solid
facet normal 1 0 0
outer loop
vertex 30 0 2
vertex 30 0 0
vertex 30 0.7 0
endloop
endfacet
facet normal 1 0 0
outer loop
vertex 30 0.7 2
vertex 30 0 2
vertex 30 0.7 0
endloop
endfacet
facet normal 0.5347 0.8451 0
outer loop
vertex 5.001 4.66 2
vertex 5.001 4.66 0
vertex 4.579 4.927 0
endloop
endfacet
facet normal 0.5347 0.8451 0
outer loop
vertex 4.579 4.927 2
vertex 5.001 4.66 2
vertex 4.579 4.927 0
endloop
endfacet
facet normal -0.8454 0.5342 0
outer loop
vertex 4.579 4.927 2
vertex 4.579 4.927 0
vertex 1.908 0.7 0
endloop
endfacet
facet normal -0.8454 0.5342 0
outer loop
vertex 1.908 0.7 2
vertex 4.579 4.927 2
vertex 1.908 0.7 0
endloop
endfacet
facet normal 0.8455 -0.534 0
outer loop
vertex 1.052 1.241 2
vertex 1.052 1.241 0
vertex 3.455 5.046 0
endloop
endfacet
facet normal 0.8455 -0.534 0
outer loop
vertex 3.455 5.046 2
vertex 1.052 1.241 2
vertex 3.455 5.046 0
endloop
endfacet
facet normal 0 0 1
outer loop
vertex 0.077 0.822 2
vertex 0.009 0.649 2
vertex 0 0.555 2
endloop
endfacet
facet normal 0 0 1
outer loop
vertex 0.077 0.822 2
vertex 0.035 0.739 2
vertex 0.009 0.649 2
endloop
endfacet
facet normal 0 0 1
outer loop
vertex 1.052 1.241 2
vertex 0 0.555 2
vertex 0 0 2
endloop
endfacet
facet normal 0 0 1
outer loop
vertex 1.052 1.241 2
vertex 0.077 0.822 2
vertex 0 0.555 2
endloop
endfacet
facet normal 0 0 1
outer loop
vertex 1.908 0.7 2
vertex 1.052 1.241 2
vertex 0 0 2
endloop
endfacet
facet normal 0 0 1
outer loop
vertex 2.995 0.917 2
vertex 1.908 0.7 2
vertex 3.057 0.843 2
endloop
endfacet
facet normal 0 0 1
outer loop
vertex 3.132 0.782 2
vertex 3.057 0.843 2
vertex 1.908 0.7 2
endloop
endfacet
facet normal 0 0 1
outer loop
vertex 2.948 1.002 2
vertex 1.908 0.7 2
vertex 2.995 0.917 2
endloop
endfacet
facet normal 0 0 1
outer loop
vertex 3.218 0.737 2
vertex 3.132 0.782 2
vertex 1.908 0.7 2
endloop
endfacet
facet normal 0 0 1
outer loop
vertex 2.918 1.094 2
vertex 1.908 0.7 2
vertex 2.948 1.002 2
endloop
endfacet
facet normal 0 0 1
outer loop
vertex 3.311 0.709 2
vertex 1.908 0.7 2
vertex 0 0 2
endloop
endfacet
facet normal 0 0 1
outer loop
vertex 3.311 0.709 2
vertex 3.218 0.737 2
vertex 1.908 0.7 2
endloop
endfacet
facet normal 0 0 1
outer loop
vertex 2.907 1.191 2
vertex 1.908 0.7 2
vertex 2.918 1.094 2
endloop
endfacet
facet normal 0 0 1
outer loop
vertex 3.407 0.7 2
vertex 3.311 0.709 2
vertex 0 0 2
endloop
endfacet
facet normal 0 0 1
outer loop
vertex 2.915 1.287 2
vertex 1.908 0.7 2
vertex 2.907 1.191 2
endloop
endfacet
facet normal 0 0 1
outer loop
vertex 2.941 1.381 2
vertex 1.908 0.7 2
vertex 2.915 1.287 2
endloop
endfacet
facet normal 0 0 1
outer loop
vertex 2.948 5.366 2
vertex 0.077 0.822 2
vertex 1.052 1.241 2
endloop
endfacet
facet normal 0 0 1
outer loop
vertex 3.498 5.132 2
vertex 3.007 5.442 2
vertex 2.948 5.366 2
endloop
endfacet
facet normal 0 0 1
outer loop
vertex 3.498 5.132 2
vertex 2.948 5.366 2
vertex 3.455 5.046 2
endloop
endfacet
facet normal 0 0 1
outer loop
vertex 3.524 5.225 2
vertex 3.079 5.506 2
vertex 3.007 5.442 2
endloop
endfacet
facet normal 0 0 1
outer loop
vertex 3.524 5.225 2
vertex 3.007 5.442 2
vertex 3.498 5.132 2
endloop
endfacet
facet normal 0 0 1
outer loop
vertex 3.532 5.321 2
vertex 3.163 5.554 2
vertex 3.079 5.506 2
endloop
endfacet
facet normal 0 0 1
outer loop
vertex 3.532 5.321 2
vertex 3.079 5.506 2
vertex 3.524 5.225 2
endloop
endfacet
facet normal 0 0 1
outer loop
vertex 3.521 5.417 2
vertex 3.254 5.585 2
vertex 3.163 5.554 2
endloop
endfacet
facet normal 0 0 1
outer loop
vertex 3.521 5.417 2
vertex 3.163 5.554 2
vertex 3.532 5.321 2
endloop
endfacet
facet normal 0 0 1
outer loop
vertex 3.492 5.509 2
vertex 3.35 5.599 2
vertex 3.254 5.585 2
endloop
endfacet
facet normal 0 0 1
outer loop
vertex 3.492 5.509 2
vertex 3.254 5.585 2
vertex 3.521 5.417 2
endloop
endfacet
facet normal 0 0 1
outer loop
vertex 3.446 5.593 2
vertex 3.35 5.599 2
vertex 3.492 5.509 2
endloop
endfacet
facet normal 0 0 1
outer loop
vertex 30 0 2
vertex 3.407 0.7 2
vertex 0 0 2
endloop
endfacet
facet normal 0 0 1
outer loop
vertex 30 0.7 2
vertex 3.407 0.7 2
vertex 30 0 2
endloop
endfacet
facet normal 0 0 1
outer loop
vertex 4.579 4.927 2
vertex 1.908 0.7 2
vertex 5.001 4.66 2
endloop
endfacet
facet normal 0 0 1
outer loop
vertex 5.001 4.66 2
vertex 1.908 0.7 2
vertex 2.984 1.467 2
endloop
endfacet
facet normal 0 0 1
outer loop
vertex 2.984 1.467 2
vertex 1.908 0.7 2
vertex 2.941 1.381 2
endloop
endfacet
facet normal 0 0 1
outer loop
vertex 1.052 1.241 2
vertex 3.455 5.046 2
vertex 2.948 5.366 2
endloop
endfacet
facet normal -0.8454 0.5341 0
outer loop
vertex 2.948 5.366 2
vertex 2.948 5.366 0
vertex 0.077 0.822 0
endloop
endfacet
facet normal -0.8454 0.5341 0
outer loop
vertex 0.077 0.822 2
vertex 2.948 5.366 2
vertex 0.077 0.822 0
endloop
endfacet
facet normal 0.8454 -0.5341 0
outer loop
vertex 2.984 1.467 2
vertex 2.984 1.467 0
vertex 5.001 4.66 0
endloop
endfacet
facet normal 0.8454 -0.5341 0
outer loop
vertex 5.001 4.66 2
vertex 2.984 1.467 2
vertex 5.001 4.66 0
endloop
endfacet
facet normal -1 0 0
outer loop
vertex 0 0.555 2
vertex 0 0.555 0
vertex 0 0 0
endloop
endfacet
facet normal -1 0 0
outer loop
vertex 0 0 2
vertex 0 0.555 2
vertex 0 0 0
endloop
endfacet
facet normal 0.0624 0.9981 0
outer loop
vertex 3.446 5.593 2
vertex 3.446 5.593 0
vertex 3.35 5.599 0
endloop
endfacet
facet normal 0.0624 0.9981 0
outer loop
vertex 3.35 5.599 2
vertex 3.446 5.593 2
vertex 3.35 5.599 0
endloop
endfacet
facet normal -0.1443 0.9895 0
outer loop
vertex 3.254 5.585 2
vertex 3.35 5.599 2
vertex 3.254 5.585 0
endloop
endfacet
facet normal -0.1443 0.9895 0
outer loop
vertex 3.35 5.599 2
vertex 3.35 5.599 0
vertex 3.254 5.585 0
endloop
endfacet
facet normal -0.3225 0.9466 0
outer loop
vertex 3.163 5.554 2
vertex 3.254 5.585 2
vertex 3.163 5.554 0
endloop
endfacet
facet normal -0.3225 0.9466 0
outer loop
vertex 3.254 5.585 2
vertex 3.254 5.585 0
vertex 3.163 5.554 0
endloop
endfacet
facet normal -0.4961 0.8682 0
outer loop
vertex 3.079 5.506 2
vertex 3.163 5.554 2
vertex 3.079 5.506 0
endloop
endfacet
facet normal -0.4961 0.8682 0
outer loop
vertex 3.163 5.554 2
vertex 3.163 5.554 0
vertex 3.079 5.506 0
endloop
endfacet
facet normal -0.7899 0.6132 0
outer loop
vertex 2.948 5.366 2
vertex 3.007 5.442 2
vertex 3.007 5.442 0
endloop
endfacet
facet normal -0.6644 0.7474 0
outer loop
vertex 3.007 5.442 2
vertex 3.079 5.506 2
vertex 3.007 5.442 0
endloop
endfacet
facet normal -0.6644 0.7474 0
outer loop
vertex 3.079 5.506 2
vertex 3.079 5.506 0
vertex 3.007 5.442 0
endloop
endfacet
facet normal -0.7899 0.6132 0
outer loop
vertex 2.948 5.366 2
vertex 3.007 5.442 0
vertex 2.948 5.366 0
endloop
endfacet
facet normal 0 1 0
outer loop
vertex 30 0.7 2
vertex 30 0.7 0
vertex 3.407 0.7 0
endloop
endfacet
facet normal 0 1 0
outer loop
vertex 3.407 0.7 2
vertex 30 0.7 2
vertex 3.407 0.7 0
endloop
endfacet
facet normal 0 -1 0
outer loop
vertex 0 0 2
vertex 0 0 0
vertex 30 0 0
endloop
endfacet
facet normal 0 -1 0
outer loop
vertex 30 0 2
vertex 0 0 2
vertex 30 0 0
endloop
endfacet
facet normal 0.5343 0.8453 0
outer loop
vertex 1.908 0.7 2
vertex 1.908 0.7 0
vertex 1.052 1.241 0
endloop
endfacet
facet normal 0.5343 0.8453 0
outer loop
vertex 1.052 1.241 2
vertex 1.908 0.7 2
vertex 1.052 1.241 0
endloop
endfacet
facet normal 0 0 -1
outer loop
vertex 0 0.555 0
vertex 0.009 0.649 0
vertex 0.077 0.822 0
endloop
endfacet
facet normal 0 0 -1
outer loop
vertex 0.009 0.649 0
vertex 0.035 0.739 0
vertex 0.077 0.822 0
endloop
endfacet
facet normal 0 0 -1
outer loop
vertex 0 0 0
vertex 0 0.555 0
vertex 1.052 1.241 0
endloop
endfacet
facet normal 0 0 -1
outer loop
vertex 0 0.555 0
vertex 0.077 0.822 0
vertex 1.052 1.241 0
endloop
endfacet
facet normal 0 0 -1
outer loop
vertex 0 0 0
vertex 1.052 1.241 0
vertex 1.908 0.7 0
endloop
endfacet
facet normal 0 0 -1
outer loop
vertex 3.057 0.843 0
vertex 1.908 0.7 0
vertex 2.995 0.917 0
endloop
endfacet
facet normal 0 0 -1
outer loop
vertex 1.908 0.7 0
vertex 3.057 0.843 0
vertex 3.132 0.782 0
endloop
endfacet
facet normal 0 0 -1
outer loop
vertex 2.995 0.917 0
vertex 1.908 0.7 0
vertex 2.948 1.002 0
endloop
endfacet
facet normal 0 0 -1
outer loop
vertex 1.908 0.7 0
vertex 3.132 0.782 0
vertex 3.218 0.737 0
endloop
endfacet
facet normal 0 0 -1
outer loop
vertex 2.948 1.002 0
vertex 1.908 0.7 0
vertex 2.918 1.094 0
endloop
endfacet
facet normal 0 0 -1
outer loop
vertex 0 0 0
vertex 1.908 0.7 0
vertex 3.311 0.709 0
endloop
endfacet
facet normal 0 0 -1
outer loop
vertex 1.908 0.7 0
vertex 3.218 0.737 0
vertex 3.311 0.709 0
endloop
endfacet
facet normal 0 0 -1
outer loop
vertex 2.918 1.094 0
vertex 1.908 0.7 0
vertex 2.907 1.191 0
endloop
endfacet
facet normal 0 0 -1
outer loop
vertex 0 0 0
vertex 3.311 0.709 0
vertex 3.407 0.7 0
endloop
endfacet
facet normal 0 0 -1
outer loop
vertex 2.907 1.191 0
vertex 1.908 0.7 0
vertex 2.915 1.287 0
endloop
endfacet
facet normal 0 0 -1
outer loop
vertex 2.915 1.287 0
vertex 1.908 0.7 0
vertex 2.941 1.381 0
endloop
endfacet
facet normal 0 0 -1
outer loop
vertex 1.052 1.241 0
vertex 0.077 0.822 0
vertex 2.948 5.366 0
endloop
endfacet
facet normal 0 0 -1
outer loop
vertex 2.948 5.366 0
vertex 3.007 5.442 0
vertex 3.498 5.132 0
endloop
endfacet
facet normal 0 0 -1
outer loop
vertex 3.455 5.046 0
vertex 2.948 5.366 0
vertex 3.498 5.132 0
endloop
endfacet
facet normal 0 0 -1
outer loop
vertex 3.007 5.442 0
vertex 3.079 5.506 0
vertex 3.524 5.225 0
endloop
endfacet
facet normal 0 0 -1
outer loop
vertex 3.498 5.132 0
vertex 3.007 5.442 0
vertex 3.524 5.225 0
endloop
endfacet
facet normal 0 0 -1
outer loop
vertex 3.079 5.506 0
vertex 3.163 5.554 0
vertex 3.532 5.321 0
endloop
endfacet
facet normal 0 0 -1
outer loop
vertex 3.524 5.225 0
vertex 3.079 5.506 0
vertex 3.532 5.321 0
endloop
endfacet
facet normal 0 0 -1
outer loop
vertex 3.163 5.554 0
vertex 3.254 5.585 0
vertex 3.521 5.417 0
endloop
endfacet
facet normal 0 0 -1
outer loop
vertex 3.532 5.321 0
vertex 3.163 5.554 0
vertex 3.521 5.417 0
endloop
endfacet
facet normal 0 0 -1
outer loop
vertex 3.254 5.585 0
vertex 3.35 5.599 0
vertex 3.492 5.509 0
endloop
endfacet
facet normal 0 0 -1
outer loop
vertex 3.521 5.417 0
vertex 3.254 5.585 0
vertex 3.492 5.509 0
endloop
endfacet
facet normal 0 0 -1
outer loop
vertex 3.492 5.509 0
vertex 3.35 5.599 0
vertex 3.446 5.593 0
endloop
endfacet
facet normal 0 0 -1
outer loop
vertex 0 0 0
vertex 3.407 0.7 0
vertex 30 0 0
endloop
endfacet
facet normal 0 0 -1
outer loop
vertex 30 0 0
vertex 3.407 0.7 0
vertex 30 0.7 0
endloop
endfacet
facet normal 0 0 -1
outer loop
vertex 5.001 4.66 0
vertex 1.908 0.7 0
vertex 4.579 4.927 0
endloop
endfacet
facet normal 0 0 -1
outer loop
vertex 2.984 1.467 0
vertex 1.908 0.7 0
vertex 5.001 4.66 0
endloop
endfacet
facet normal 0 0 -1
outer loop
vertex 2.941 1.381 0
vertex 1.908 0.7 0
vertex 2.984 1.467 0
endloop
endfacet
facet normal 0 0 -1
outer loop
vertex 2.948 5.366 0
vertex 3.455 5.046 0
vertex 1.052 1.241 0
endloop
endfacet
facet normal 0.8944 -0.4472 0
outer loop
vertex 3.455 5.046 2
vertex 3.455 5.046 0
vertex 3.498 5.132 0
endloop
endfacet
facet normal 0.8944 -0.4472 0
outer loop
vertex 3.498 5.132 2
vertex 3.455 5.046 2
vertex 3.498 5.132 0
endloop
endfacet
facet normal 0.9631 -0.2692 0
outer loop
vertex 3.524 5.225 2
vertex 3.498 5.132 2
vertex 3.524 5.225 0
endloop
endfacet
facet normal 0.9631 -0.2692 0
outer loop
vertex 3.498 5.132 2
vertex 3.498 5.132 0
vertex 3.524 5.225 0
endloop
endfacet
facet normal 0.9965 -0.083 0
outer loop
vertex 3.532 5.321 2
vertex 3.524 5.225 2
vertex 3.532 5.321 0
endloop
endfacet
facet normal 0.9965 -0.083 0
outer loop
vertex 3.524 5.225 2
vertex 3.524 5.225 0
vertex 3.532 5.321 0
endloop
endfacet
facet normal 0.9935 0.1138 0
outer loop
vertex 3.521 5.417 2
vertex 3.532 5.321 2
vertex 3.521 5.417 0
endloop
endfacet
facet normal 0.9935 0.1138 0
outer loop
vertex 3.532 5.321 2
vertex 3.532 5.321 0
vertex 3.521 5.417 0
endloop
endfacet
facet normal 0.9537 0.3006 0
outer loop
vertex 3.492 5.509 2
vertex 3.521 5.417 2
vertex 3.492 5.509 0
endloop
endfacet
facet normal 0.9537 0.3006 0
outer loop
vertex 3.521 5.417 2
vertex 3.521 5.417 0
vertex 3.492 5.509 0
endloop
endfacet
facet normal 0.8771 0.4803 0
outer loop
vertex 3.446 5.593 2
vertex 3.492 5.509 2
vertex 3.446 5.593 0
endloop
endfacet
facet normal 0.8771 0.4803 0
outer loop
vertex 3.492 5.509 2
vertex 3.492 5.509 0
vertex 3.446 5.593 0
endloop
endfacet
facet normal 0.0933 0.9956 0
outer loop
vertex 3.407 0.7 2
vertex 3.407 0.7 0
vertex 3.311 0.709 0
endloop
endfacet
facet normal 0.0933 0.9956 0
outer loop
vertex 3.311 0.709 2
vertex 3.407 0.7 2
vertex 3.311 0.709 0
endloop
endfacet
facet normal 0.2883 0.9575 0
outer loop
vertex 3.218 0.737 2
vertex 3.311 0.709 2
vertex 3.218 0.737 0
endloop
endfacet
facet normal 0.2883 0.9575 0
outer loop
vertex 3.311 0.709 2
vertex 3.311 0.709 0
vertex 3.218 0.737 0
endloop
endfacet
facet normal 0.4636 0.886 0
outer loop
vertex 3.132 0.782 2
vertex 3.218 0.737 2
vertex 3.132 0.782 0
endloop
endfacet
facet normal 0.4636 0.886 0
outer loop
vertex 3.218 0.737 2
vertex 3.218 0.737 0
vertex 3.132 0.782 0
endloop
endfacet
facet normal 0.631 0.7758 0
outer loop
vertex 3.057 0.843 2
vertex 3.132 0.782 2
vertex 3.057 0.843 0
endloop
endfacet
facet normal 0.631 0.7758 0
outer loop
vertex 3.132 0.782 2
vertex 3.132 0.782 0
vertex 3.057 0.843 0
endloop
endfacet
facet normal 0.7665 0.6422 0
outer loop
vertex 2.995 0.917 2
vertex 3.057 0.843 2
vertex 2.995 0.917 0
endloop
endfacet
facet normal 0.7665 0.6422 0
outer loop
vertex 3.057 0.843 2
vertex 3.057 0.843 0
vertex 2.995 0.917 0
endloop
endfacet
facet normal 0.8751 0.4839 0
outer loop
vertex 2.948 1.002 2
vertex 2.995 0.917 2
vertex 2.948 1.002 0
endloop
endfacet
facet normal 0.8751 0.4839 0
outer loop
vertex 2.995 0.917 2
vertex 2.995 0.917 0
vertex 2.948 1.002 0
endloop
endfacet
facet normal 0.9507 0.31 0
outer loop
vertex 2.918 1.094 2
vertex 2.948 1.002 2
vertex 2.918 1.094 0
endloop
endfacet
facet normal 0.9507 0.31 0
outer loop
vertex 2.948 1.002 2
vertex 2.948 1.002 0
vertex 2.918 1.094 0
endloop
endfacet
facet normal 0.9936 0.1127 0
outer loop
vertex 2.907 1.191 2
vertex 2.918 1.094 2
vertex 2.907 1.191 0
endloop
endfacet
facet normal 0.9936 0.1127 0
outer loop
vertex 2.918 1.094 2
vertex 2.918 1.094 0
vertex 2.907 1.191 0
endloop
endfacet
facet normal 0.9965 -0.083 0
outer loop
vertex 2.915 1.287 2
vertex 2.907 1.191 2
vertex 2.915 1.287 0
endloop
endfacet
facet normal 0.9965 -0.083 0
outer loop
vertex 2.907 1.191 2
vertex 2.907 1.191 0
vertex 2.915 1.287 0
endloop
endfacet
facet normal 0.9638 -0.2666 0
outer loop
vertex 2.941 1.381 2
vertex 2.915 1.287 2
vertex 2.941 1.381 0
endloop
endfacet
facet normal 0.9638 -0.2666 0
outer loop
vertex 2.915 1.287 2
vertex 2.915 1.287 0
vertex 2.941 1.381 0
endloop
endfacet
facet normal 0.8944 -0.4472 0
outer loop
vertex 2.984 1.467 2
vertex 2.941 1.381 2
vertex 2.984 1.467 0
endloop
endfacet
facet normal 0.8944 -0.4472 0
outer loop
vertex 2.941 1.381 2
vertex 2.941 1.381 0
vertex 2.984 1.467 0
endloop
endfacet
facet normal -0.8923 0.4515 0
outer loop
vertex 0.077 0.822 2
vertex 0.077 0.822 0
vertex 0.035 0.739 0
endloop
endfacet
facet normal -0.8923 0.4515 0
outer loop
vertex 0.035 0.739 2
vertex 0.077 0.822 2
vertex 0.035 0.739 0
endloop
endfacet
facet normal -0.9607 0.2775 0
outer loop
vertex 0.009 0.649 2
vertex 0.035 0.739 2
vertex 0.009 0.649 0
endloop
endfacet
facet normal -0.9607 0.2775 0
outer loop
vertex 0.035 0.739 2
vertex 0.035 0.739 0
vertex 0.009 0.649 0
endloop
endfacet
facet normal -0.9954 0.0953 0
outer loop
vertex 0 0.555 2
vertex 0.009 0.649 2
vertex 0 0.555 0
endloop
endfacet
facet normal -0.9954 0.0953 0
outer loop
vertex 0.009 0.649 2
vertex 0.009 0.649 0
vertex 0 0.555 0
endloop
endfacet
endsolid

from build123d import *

# Parameters (mm, degrees)
F1_DEPTH    = 2
F2_T1_DEPTH = 2
F2_T3_DEPTH = 2.7234665539
F2_T5_DEPTH = 4.5


# Not quite as in the source:
# - a fillet or chamfer that OpenCascade refuses, or shapes differently, is made with other operations: its cross-section is extruded or revolved along the edge and cut away or added


with BuildPart() as f1:
    # F0 (on Top) → F1 (new body)
    with BuildSketch(Plane.XY):
        Polygon((0, 0.7), (0, 0), (30, 0), (30, 0.7), (2.4998066677, 0.7), (5.0013818819, 4.6602413969), (4.5786552685, 4.9272661341), (1.9084078958, 0.7), (1.0515667407, 1.2412429146), (3.7218141134, 5.4685090487), (3.2145421773, 5.7889387335), align=None)
    extrude(amount=F1_DEPTH)

    # F2: fillet of radius 0.5 on 4 edges, made by hand

    # F2_s2 → F2_t1 (join)
    with BuildSketch(Plane.XY):
        with BuildLine():
            ThreePointArc((3.4070416429, 0.7), (2.9691419006, 0.9586624445), (2.9843150295, 1.4670247373))
            Line((2.9843150295, 1.4670247373), (2.4998066677, 0.7))
            Line((2.4998066677, 0.7), (3.4070416429, 0.7))
        make_face()
    extrude(amount=F2_T1_DEPTH)

    # F2_s4 → F2_t3 (cut)
    with BuildSketch(Plane.XY.offset(-0.3617332769)):
        with BuildLine():
            ThreePointArc((0.0772733866, 0.8223314265), (0.0197067007, 0.6942971445), (0, 0.5553066892))
            Line((0, 0.5553066892), (0, 0.7))
            Line((0, 0.7), (0.0772733866, 0.8223314265))
        make_face()
    extrude(amount=F2_T3_DEPTH, mode=Mode.SUBTRACT)

    # F2_s6 → F2_t5 (cut)
    with BuildSketch(Plane.XY.offset(-1.25)):
        with BuildLine():
            ThreePointArc((3.6372687907, 5.5219139962), (3.2601462009, 5.5869152402), (2.94751744, 5.3662121201))
            Line((2.94751744, 5.3662121201), (3.2145421773, 5.7889387335))
            Line((3.2145421773, 5.7889387335), (3.6372687907, 5.5219139962))
        make_face()
        with BuildLine():
            ThreePointArc((3.4547893761, 5.0457824353), (3.5197906201, 5.4229050251), (3.2990874999, 5.735533786))
            Line((3.2990874999, 5.735533786), (3.7218141134, 5.4685090487))
            Line((3.7218141134, 5.4685090487), (3.4547893761, 5.0457824353))
        make_face()
    extrude(amount=F2_T5_DEPTH, mode=Mode.SUBTRACT)


solid = f1.part
